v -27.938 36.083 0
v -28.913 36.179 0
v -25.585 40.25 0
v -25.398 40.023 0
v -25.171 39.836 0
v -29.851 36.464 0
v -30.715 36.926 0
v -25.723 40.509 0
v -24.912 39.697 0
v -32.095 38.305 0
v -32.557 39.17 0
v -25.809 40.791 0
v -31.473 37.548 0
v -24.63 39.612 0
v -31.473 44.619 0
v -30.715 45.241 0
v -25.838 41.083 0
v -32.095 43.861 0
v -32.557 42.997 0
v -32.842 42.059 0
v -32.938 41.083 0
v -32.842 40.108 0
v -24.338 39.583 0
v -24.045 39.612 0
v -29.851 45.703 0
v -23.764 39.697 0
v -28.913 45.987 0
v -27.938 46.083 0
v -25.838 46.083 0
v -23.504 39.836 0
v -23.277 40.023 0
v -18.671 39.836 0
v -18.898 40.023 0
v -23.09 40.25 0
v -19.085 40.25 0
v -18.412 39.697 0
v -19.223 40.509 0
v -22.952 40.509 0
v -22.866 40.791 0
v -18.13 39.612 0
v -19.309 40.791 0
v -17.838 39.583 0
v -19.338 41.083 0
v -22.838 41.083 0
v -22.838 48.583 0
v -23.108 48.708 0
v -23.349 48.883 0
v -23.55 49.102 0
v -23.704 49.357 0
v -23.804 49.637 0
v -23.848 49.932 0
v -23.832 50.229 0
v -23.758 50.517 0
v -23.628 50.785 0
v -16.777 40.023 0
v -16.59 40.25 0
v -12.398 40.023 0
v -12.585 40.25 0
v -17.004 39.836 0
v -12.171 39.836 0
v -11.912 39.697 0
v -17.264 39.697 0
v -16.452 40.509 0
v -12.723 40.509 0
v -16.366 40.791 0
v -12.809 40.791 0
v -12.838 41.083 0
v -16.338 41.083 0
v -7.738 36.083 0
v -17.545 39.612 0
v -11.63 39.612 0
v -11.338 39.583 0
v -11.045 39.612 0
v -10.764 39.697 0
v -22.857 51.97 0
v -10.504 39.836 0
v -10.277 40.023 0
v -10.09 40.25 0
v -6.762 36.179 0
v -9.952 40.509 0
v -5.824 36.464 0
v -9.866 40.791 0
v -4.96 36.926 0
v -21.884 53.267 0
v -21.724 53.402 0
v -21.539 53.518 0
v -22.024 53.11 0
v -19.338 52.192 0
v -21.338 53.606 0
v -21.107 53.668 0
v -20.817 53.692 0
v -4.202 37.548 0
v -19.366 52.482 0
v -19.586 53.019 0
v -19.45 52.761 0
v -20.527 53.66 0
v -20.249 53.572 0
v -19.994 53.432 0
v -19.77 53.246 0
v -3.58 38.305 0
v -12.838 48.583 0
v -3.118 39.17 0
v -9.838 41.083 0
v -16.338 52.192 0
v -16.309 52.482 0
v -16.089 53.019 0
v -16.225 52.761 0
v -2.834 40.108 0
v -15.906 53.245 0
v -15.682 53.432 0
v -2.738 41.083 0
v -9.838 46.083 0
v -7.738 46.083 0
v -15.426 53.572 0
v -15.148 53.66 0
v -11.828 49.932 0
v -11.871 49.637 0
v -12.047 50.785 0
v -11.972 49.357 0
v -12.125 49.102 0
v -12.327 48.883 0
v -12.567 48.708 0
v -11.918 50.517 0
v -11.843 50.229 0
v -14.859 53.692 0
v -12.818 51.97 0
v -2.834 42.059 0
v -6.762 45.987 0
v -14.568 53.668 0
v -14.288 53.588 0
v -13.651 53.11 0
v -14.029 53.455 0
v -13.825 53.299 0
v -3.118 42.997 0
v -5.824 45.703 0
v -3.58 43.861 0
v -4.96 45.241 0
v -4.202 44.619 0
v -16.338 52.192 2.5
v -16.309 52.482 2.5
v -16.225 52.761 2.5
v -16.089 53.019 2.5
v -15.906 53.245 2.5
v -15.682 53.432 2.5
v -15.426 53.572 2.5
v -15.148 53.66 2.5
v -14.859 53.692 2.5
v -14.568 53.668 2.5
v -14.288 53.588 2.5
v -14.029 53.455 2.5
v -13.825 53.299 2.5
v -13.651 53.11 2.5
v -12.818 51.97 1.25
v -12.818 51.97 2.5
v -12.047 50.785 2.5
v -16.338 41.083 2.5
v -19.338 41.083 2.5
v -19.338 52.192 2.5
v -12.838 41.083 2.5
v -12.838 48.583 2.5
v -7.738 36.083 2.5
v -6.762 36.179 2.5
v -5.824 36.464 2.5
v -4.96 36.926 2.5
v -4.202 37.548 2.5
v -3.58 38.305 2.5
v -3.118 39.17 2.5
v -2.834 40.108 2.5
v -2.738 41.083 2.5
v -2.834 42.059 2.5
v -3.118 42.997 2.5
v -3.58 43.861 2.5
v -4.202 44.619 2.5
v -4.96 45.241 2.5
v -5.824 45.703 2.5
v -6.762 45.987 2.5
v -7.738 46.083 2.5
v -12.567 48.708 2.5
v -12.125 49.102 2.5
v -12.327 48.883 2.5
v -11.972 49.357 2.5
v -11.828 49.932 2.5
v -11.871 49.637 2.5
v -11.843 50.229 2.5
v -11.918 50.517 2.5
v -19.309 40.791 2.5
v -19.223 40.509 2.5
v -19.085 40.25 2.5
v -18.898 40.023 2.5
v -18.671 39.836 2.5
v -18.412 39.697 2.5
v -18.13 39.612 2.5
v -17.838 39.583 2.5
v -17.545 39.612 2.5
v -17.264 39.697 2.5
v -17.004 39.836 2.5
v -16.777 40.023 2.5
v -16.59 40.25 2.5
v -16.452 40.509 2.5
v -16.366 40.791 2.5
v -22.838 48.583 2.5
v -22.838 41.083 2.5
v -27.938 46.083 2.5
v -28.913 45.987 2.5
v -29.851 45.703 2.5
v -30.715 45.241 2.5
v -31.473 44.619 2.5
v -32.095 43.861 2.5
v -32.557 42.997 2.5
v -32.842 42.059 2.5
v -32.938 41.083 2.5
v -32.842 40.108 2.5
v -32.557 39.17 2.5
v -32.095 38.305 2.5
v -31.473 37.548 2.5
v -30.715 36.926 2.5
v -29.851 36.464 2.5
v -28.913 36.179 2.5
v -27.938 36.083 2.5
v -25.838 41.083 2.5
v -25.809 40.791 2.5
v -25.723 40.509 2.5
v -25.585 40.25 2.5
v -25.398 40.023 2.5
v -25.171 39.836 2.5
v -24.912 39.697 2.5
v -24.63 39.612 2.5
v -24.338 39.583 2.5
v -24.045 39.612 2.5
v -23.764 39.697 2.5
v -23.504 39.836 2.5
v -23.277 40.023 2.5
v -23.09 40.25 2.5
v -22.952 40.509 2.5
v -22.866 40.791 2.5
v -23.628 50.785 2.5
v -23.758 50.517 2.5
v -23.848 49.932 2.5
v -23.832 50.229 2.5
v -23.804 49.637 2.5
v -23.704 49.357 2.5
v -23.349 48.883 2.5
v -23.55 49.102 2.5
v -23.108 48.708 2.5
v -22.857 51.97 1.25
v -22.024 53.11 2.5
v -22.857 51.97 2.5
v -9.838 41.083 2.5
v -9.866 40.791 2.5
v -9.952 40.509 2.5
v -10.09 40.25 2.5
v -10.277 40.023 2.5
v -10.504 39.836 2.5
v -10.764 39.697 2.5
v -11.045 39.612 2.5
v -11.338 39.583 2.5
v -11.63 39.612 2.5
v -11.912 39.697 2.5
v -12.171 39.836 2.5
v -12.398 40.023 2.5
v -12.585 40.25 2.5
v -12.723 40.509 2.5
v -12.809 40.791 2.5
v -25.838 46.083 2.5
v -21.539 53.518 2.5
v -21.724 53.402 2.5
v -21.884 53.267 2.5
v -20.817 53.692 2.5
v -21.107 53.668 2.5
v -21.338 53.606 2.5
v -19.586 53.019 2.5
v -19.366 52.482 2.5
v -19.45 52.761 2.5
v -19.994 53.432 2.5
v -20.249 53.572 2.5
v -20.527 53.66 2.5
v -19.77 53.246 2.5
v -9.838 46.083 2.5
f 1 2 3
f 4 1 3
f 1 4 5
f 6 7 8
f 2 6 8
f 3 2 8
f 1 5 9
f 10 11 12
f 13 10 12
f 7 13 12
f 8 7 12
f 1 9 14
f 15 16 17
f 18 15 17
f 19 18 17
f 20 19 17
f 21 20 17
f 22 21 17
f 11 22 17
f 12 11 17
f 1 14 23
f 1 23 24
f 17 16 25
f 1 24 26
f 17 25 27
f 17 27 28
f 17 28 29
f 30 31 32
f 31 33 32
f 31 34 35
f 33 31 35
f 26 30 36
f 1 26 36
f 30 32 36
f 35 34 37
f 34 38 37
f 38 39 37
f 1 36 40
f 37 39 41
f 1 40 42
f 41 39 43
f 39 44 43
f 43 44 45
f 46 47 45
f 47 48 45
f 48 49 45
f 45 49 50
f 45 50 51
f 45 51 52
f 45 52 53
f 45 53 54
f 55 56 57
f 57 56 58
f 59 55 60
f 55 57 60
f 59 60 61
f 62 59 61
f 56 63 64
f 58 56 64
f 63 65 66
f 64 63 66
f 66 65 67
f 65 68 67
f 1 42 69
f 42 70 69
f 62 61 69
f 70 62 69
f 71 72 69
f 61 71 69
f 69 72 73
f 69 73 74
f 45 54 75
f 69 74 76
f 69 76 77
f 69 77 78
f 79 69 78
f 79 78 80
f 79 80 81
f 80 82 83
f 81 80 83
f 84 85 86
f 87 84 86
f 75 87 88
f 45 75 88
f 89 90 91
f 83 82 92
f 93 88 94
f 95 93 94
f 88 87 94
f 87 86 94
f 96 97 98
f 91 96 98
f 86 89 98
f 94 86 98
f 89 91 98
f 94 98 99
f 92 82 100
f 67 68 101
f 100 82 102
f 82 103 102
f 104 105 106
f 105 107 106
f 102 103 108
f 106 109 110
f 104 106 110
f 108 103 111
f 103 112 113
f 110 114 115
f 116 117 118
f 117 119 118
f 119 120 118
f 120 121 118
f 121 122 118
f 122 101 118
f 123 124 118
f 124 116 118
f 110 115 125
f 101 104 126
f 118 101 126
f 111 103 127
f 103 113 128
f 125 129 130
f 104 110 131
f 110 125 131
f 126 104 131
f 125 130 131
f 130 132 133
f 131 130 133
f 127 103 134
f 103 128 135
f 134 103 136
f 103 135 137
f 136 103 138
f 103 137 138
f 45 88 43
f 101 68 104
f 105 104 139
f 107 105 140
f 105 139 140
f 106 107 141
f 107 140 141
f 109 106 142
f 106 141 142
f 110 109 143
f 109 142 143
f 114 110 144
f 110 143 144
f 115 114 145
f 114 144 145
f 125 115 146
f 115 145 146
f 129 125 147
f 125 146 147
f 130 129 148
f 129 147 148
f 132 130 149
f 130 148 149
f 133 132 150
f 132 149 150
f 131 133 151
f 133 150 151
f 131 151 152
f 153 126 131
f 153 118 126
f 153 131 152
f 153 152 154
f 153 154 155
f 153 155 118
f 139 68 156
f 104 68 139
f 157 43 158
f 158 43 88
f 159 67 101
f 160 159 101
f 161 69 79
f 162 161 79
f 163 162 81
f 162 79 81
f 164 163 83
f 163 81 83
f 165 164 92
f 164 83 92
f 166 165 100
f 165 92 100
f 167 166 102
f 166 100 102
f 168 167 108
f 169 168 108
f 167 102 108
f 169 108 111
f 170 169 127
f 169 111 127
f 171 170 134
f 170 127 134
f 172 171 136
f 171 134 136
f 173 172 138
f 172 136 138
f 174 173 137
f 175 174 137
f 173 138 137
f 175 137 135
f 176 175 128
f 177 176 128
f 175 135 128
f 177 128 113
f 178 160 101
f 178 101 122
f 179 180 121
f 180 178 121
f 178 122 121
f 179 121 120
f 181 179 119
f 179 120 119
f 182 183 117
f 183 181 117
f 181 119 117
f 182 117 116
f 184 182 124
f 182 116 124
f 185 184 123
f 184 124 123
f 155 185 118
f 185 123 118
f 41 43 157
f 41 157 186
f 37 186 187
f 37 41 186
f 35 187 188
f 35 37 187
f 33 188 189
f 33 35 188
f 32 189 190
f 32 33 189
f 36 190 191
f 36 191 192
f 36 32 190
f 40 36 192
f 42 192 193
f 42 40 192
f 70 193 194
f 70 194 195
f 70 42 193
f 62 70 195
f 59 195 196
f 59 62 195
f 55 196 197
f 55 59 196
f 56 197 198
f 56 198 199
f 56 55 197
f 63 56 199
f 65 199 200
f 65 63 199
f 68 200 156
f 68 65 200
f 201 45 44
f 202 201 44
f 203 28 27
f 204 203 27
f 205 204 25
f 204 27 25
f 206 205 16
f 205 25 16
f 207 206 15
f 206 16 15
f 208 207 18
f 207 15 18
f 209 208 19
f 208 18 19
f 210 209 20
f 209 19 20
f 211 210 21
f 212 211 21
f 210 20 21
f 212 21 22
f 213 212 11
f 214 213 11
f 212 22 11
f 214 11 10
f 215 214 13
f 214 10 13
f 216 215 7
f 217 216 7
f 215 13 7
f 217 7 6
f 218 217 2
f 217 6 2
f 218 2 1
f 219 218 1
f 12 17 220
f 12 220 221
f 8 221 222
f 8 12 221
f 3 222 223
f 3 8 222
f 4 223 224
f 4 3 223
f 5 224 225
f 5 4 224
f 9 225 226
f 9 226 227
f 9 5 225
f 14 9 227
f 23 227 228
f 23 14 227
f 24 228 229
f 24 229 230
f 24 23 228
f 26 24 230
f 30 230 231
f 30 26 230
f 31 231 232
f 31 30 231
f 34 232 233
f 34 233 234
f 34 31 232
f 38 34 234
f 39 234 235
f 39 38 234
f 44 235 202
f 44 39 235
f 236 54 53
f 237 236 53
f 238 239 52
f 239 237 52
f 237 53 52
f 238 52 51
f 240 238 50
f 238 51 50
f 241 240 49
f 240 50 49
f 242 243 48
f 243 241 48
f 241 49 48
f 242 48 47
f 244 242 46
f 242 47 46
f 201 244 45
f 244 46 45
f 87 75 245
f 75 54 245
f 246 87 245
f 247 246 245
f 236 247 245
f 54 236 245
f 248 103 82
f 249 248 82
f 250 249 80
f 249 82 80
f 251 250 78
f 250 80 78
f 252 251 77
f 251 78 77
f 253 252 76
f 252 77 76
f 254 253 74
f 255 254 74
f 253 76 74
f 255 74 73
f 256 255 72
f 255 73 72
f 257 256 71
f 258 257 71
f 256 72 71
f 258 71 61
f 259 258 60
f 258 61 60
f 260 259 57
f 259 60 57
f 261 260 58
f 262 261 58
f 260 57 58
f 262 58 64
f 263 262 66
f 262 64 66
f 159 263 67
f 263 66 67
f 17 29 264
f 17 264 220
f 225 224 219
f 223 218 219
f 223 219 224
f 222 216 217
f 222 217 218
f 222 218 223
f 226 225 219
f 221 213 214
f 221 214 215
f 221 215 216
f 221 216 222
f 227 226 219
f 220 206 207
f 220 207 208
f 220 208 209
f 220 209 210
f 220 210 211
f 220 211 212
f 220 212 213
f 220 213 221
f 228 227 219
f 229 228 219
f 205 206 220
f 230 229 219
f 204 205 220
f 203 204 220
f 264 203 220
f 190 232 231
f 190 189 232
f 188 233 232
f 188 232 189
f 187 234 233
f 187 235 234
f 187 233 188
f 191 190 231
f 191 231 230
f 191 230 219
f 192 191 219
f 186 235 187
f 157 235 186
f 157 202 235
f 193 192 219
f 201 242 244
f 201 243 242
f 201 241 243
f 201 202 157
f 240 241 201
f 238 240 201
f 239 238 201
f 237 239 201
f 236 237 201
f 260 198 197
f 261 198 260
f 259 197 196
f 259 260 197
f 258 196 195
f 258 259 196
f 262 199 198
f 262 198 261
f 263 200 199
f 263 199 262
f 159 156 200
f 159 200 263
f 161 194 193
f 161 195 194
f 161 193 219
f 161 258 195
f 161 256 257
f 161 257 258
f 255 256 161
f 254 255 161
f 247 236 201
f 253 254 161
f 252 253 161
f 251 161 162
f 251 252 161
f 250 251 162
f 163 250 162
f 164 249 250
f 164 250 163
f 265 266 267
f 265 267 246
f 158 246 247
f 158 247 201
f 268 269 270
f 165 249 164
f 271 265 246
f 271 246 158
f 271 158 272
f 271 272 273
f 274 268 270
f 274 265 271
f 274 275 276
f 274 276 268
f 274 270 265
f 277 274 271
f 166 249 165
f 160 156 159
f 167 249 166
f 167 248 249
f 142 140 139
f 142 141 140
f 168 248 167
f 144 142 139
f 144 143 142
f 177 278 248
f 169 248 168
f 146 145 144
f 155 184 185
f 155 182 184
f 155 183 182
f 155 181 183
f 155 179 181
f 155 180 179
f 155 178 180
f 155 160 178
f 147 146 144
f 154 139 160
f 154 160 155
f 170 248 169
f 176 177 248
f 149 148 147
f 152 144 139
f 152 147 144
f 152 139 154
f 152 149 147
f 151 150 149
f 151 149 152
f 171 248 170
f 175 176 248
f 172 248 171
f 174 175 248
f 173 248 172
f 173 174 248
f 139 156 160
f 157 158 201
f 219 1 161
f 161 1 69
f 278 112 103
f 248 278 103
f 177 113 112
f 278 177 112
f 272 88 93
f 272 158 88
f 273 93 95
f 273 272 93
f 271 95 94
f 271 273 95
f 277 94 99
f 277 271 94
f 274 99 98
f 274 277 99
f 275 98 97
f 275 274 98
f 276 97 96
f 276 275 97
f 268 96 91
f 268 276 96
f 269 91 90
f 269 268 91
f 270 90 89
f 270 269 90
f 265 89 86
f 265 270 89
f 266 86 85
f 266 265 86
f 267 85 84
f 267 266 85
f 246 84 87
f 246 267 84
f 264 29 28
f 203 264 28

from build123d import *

# Parameters (mm, degrees)
BOSS_EXTRUDE1_DEPTH = 2.5
CUT_EXTRUDE1_START  = -2.5
CUT_EXTRUDE1_DEPTH  = 2.5
FILLET1_R           = 1.5
FILLET2_R           = 1.5


with BuildPart() as part:
    # Sketch1 → Boss-Extrude1 (new body)
    with BuildSketch(Plane.XY):
        with BuildLine():
            Line((-22.837615564, 46.083177434), (-27.937615564, 46.083177434))
            ThreePointArc((-27.937615564, 46.083177434), (-32.937615564, 41.083177434), (-27.937615564, 36.083177434))
            Line((-27.937615564, 36.083177434), (-7.737615564, 36.083177434))
            ThreePointArc((-7.737615564, 36.083177434), (-2.737615564, 41.083177434), (-7.737615564, 46.083177434))
            Line((-7.737615564, 46.083177434), (-12.837615564, 46.083177434))
            Line((-12.837615564, 46.083177434), (-12.837615564, 48.583177434))
            Line((-12.837615564, 48.583177434), (-10.837615564, 48.583177434))
            add(Edge.make_bspline(
                [(-16.337615564, 56.083177434), (-12.915611401, 52.825980487), (-10.837615564, 48.583177434)],
                knots=[0, 0, 0, 1, 1, 1], degree=2))
            Line((-16.337615564, 56.083177434), (-16.337615564, 46.083177434))
            ThreePointArc((-16.337615564, 46.083177434), (-17.837615564, 44.583177434), (-19.337615564, 46.083177434))
            Line((-19.337615564, 46.083177434), (-19.337615564, 56.083177434))
            add(Edge.make_bspline(
                [(-19.337615564, 56.083177434), (-22.759619727, 52.825980487), (-24.837615564, 48.583177434)],
                knots=[0, 0, 0, 1, 1, 1], degree=2))
            Line((-24.837615564, 48.583177434), (-22.837615564, 48.583177434))
            Line((-22.837615564, 48.583177434), (-22.837615564, 46.083177434))
        make_face()
    extrude(amount=BOSS_EXTRUDE1_DEPTH)

    # Sketch2 → Cut-Extrude1 (cut)
    with BuildSketch(Plane.XY.offset(2.5).offset(CUT_EXTRUDE1_START)):
        with BuildLine():
            Line((-9.837615564, 46.083177434), (-9.837615564, 41.083177434))
            ThreePointArc((-9.837615564, 41.083177434), (-11.337615564, 39.583177434), (-12.837615564, 41.083177434))
            Line((-12.837615564, 41.083177434), (-12.837615564, 46.083177434))
            ThreePointArc((-12.837615564, 46.083177434), (-11.337615564, 47.583177434), (-9.837615564, 46.083177434))
        make_face()
        with BuildLine():
            Line((-25.837615564, 46.083177434), (-25.837615564, 41.083177434))
            ThreePointArc((-25.837615564, 41.083177434), (-24.337615564, 39.583177434), (-22.837615564, 41.083177434))
            Line((-22.837615564, 41.083177434), (-22.837615564, 46.083177434))
            ThreePointArc((-22.837615564, 46.083177434), (-24.337615564, 47.583177434), (-25.837615564, 46.083177434))
        make_face()
        with BuildLine():
            Line((-19.337615564, 46.083177434), (-19.337615564, 41.083177434))
            ThreePointArc((-19.337615564, 41.083177434), (-17.837615564, 39.583177434), (-16.337615564, 41.083177434))
            Line((-16.337615564, 41.083177434), (-16.337615564, 46.083177434))
            ThreePointArc((-16.337615564, 46.083177434), (-17.837615564, 47.583177434), (-19.337615564, 46.083177434))
        make_face()
    extrude(amount=CUT_EXTRUDE1_DEPTH, mode=Mode.SUBTRACT)

    # Fillet1
    # the kernel refuses this fillet: 1.5 mm, written as the material it takes off along each edge
    with BuildSketch(Plane(origin=(-10.837615564, 48.583177434, -6.280550784), x_dir=(-1, 0, 0), z_dir=(0, 0, 1))) as fillet1_piece_1:
        with BuildLine():
            CenterArc((2.488462024, -1.418240054), FILLET1_R, 109.004435481, 102.492563124)
            Line((1.209460724, -2.201920903), (1.183880698, -2.21759452))
            ThreePointArc((1.183880698, -2.21759452), (0.552459457, -1.12966162), (-0.026942162, -0.013195451))
            Line((-0.026942162, -0.013195451), (0, 0.03))
            ThreePointArc((0, 0.03), (1, 0.03), (1.99023076, 0.028364801))
            Line((1.99023076, 0.028364801), (2, 0))
        make_face()
    extrude(amount=15.061101567, mode=Mode.SUBTRACT)
    with BuildSketch(Plane(origin=(-24.837615564, 48.583177434, -6.280550784), x_dir=(1, 0, 0), z_dir=(0, 0, 1))) as fillet1_piece_2:
        with BuildLine():
            CenterArc((2.488462024, 1.418240054), FILLET1_R, 148.503001395, 102.492563124)
            Line((1.209460724, 2.201920903), (1.183880698, 2.21759452))
            ThreePointArc((1.183880698, 2.21759452), (0.552459457, 1.12966162), (-0.026942162, 0.013195451))
            Line((-0.026942162, 0.013195451), (0, -0.03))
            ThreePointArc((0, -0.03), (1, -0.03), (1.99023076, -0.028364801))
            Line((1.99023076, -0.028364801), (2, 0))
        make_face()
    extrude(amount=15.061101567, mode=Mode.SUBTRACT)

    # Fillet2
    fillet2_edges = [part.edges().sort_by_distance(p)[0] for p in [
        (-16.337615564, 56.083177434, 1.25),
        (-19.337615564, 56.083177434, 1.25),
    ]]
    fillet(fillet2_edges, radius=FILLET2_R)


solid = part.part
